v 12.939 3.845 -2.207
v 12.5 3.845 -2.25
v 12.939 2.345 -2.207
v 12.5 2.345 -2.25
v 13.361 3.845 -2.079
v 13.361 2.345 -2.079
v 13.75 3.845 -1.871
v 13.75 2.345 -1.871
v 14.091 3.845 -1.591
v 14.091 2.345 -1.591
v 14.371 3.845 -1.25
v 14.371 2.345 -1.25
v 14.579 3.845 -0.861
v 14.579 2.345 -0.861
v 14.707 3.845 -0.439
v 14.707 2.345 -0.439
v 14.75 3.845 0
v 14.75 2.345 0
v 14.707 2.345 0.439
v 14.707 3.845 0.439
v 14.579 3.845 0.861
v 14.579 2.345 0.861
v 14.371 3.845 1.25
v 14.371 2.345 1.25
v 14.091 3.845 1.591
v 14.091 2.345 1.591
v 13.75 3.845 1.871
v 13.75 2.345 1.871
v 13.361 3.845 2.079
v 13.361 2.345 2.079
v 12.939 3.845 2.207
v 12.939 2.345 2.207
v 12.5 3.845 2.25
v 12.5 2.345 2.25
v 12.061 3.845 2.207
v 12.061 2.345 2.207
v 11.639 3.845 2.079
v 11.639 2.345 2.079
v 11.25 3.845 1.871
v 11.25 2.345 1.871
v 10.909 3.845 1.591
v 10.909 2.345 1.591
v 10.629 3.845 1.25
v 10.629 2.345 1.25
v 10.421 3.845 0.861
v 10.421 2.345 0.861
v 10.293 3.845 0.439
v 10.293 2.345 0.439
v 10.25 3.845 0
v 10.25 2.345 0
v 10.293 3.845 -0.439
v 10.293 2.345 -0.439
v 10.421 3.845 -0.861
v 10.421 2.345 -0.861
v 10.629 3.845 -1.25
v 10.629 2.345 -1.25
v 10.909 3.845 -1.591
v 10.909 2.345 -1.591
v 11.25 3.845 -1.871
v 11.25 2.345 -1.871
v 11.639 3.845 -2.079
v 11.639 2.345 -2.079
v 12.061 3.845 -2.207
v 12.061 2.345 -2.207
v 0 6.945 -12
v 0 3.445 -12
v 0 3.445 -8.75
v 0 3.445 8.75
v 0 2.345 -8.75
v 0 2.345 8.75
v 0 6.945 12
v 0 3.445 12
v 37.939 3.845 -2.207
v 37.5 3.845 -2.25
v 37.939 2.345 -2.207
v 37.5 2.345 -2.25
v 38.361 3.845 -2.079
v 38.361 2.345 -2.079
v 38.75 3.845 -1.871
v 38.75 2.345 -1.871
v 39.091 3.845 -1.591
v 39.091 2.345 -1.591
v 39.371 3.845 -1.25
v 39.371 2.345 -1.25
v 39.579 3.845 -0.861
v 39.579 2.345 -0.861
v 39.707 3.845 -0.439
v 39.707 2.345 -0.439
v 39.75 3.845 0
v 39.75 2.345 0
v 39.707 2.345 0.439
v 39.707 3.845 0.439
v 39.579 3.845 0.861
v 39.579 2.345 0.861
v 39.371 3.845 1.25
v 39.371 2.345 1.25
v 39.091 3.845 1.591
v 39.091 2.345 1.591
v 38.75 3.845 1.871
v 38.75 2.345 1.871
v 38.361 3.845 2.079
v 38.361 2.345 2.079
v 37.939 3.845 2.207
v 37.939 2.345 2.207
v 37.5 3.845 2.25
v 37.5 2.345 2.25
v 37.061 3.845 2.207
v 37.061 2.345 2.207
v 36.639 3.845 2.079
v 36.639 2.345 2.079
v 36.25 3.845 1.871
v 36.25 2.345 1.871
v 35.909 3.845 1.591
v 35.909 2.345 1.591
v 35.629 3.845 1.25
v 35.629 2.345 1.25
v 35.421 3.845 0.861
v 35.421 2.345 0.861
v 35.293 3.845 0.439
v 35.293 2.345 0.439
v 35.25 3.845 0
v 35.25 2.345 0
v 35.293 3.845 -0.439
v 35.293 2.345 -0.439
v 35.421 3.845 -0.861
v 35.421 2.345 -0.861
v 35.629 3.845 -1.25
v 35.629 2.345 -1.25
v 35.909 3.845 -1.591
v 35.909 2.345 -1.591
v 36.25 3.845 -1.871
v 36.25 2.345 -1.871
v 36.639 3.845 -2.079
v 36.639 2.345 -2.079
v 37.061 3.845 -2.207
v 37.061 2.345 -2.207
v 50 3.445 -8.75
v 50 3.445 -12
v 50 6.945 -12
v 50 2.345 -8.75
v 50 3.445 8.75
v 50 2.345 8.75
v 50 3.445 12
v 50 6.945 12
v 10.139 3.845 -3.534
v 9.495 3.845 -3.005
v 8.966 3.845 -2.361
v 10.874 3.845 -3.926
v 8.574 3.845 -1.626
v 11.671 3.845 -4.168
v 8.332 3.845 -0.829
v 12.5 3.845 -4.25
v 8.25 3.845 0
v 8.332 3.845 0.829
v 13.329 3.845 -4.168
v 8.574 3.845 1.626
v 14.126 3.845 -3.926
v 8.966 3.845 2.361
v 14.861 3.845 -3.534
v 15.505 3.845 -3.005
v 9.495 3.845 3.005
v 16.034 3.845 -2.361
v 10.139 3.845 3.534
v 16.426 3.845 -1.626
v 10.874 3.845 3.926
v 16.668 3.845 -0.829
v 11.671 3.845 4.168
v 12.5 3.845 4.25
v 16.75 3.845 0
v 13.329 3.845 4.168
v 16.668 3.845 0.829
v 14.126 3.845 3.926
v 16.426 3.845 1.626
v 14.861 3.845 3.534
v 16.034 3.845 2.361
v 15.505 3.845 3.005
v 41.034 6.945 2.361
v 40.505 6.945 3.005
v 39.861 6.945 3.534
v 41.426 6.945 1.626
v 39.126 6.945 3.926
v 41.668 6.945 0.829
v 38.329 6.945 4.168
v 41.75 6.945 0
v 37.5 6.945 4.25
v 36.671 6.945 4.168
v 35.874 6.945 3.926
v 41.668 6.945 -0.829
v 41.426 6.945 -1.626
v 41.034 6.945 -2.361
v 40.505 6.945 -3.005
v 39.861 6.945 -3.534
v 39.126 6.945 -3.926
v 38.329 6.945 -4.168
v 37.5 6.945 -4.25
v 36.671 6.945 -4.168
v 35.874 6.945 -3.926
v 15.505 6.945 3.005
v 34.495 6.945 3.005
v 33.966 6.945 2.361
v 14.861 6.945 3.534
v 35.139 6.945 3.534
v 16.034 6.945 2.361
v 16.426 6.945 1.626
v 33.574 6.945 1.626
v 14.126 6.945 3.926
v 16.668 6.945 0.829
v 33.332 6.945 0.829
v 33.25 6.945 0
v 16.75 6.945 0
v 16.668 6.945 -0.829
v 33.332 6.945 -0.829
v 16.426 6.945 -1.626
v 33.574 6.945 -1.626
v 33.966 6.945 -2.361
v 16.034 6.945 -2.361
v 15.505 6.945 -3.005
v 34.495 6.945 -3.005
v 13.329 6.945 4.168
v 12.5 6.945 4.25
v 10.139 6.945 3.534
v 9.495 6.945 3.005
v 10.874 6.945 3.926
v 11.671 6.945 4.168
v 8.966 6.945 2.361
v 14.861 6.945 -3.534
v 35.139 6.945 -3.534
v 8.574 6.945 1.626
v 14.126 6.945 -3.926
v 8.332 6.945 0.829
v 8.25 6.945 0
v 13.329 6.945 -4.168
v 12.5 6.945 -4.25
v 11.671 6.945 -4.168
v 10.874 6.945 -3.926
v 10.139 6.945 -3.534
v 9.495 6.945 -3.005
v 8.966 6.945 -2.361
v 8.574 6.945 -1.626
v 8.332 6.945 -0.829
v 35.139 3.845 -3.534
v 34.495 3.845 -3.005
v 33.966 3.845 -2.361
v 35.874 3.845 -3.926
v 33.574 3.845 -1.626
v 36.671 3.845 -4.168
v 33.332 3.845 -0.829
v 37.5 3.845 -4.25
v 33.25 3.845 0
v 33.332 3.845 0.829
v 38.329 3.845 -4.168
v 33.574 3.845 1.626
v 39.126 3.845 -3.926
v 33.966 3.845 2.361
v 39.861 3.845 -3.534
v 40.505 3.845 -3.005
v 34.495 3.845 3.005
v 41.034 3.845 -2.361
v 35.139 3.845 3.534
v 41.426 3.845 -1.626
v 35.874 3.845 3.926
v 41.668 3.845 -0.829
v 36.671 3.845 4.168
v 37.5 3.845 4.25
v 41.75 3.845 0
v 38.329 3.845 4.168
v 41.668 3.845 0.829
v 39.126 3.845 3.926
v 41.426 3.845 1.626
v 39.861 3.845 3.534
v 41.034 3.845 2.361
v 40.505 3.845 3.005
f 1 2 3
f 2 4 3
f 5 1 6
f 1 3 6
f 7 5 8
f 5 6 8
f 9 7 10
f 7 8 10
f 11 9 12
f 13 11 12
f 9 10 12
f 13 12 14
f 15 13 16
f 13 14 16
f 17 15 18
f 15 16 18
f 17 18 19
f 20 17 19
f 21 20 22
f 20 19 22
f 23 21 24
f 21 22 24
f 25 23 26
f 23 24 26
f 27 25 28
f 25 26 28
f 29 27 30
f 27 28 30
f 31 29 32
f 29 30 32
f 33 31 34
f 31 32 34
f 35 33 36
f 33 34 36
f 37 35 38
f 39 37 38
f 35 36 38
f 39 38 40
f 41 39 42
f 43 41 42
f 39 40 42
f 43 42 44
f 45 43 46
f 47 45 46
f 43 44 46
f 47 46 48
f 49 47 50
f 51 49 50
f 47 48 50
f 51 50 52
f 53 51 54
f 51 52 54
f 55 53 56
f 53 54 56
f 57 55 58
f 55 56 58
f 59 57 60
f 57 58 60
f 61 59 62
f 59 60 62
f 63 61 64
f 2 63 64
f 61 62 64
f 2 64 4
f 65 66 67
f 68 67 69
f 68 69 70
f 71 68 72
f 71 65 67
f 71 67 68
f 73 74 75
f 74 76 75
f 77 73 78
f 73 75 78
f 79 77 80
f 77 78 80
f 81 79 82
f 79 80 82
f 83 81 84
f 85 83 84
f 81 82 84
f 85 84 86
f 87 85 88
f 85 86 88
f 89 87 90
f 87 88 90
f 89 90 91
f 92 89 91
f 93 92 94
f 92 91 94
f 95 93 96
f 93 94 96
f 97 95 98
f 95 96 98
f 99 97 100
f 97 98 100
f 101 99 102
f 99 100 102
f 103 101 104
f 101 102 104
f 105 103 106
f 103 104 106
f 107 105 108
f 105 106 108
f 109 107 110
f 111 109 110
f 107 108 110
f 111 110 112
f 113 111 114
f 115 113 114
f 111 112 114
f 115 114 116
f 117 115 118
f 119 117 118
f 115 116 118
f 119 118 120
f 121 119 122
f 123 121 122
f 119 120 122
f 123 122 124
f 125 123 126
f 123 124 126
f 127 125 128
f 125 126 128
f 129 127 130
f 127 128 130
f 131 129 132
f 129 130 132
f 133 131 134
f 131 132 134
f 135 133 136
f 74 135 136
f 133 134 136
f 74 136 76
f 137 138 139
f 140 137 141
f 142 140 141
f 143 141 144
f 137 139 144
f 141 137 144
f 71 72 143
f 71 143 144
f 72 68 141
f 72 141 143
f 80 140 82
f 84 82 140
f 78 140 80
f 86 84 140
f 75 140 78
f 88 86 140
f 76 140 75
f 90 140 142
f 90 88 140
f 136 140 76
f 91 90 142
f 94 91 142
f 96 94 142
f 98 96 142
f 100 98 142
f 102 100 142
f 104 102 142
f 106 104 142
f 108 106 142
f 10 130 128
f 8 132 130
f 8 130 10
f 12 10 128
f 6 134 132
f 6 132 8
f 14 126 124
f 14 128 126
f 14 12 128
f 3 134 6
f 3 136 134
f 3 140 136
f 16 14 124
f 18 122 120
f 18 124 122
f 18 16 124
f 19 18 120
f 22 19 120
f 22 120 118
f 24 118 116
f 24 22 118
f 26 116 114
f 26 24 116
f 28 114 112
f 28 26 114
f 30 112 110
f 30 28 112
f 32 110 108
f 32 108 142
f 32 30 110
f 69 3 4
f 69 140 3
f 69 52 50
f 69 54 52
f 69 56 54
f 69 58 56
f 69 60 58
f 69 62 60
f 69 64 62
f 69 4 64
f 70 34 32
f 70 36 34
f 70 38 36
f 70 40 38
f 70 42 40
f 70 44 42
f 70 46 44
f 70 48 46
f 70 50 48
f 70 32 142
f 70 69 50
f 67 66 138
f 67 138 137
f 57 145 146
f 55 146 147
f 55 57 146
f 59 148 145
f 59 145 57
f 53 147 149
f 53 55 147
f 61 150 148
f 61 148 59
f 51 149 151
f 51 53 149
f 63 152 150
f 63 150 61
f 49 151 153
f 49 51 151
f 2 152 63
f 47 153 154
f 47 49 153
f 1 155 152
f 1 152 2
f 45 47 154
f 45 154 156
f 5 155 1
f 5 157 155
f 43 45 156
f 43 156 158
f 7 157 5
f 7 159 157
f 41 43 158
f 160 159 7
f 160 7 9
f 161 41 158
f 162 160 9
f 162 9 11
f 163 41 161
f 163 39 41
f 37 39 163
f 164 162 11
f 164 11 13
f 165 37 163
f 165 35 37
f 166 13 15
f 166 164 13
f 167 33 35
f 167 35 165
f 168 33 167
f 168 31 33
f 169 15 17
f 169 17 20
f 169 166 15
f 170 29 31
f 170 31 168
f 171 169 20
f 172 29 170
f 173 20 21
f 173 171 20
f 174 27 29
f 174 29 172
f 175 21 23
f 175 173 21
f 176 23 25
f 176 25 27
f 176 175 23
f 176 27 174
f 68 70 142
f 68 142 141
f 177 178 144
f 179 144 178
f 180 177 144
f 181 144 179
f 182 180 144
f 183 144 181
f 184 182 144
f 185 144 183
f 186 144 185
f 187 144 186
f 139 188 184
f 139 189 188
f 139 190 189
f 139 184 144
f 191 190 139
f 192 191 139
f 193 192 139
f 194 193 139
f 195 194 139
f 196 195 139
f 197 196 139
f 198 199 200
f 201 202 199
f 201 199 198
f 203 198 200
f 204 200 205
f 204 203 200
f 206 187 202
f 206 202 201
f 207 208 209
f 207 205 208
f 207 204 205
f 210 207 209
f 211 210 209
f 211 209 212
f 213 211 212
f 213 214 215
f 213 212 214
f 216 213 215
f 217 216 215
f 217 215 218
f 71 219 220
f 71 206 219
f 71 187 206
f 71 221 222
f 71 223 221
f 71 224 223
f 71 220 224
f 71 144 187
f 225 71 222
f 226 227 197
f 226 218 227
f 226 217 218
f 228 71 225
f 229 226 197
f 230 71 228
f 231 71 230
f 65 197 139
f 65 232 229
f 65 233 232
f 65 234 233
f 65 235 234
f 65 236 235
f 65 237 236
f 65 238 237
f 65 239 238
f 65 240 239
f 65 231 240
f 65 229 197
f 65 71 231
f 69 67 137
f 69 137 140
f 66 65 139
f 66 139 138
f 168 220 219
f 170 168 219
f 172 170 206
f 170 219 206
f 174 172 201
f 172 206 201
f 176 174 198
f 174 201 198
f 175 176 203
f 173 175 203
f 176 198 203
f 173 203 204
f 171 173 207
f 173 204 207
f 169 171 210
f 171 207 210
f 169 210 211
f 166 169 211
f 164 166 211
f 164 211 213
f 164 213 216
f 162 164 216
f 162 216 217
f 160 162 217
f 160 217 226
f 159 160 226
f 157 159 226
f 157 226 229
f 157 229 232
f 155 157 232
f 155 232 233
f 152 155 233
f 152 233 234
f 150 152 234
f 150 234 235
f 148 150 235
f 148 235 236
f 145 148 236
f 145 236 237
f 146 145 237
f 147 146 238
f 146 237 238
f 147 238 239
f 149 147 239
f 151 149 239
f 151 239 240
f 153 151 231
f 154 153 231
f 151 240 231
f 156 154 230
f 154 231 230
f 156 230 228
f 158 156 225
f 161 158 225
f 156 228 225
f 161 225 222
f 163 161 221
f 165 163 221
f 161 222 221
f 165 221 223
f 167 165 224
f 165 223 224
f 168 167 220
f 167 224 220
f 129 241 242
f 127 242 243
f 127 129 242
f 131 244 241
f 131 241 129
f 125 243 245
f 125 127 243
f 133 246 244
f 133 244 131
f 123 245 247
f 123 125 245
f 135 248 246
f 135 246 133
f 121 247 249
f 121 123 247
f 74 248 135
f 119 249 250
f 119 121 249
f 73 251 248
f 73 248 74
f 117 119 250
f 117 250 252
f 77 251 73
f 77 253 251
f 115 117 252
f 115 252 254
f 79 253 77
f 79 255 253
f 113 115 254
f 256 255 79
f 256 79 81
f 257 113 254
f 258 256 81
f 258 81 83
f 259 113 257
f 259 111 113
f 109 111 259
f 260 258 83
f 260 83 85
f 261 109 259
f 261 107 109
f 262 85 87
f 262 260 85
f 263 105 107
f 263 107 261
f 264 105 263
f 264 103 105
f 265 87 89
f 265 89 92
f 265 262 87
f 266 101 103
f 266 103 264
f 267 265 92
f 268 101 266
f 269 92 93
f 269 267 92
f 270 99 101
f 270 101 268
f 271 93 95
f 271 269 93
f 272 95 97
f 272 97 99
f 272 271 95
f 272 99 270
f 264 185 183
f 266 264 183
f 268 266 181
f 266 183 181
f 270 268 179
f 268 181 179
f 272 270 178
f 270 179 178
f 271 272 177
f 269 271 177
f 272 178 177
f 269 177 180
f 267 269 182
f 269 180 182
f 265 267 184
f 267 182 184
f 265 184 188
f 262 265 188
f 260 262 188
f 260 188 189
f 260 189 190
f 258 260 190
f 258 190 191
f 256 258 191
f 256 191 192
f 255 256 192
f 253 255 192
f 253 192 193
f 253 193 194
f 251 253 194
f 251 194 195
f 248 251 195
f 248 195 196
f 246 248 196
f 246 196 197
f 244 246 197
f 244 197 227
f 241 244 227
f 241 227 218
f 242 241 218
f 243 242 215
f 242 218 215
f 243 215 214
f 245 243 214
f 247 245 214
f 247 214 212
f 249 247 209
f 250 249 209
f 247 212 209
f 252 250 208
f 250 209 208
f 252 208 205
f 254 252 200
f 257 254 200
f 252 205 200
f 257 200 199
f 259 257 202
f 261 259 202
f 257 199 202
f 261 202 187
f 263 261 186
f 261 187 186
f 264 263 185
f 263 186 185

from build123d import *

# Parameters (mm, degrees)
BOSS_EXTRU_1_DEPTH                                 = 50
CHAMBRAGE_POUR_VIS_T_TE_HEXAGONALE_M42_D           = 4.5
CHAMBRAGE_POUR_VIS_T_TE_HEXAGONALE_M42_CBORE_D     = 8.5
CHAMBRAGE_POUR_VIS_T_TE_HEXAGONALE_M42_CBORE_DEPTH = 3.1


with BuildPart() as part:
    # Esquisse2 → Boss.-Extru.1 (new body)
    with BuildSketch(Plane(origin=(0, 0, 0), x_dir=(0, 0, -1), z_dir=(1, 0, 0))):
        Polygon((-12, 6.945454545), (12, 6.945454545), (12, 3.445454545), (8.75, 3.445454545), (8.75, 2.345454545), (-8.75, 2.345454545), (-8.75, 3.445454545), (-12, 3.445454545), align=None)
    extrude(amount=BOSS_EXTRU_1_DEPTH)

    # Chambrage pour vis à tête hexagonale M42 (through all)
    with Locations(Plane(origin=(12.5, 6.945454545, 0), x_dir=(0, 0, 1), z_dir=(0, 1, 0))):
        with Locations((0, 0), (0, 25)):
            CounterBoreHole(CHAMBRAGE_POUR_VIS_T_TE_HEXAGONALE_M42_D / 2, CHAMBRAGE_POUR_VIS_T_TE_HEXAGONALE_M42_CBORE_D / 2, CHAMBRAGE_POUR_VIS_T_TE_HEXAGONALE_M42_CBORE_DEPTH)


solid = part.part
